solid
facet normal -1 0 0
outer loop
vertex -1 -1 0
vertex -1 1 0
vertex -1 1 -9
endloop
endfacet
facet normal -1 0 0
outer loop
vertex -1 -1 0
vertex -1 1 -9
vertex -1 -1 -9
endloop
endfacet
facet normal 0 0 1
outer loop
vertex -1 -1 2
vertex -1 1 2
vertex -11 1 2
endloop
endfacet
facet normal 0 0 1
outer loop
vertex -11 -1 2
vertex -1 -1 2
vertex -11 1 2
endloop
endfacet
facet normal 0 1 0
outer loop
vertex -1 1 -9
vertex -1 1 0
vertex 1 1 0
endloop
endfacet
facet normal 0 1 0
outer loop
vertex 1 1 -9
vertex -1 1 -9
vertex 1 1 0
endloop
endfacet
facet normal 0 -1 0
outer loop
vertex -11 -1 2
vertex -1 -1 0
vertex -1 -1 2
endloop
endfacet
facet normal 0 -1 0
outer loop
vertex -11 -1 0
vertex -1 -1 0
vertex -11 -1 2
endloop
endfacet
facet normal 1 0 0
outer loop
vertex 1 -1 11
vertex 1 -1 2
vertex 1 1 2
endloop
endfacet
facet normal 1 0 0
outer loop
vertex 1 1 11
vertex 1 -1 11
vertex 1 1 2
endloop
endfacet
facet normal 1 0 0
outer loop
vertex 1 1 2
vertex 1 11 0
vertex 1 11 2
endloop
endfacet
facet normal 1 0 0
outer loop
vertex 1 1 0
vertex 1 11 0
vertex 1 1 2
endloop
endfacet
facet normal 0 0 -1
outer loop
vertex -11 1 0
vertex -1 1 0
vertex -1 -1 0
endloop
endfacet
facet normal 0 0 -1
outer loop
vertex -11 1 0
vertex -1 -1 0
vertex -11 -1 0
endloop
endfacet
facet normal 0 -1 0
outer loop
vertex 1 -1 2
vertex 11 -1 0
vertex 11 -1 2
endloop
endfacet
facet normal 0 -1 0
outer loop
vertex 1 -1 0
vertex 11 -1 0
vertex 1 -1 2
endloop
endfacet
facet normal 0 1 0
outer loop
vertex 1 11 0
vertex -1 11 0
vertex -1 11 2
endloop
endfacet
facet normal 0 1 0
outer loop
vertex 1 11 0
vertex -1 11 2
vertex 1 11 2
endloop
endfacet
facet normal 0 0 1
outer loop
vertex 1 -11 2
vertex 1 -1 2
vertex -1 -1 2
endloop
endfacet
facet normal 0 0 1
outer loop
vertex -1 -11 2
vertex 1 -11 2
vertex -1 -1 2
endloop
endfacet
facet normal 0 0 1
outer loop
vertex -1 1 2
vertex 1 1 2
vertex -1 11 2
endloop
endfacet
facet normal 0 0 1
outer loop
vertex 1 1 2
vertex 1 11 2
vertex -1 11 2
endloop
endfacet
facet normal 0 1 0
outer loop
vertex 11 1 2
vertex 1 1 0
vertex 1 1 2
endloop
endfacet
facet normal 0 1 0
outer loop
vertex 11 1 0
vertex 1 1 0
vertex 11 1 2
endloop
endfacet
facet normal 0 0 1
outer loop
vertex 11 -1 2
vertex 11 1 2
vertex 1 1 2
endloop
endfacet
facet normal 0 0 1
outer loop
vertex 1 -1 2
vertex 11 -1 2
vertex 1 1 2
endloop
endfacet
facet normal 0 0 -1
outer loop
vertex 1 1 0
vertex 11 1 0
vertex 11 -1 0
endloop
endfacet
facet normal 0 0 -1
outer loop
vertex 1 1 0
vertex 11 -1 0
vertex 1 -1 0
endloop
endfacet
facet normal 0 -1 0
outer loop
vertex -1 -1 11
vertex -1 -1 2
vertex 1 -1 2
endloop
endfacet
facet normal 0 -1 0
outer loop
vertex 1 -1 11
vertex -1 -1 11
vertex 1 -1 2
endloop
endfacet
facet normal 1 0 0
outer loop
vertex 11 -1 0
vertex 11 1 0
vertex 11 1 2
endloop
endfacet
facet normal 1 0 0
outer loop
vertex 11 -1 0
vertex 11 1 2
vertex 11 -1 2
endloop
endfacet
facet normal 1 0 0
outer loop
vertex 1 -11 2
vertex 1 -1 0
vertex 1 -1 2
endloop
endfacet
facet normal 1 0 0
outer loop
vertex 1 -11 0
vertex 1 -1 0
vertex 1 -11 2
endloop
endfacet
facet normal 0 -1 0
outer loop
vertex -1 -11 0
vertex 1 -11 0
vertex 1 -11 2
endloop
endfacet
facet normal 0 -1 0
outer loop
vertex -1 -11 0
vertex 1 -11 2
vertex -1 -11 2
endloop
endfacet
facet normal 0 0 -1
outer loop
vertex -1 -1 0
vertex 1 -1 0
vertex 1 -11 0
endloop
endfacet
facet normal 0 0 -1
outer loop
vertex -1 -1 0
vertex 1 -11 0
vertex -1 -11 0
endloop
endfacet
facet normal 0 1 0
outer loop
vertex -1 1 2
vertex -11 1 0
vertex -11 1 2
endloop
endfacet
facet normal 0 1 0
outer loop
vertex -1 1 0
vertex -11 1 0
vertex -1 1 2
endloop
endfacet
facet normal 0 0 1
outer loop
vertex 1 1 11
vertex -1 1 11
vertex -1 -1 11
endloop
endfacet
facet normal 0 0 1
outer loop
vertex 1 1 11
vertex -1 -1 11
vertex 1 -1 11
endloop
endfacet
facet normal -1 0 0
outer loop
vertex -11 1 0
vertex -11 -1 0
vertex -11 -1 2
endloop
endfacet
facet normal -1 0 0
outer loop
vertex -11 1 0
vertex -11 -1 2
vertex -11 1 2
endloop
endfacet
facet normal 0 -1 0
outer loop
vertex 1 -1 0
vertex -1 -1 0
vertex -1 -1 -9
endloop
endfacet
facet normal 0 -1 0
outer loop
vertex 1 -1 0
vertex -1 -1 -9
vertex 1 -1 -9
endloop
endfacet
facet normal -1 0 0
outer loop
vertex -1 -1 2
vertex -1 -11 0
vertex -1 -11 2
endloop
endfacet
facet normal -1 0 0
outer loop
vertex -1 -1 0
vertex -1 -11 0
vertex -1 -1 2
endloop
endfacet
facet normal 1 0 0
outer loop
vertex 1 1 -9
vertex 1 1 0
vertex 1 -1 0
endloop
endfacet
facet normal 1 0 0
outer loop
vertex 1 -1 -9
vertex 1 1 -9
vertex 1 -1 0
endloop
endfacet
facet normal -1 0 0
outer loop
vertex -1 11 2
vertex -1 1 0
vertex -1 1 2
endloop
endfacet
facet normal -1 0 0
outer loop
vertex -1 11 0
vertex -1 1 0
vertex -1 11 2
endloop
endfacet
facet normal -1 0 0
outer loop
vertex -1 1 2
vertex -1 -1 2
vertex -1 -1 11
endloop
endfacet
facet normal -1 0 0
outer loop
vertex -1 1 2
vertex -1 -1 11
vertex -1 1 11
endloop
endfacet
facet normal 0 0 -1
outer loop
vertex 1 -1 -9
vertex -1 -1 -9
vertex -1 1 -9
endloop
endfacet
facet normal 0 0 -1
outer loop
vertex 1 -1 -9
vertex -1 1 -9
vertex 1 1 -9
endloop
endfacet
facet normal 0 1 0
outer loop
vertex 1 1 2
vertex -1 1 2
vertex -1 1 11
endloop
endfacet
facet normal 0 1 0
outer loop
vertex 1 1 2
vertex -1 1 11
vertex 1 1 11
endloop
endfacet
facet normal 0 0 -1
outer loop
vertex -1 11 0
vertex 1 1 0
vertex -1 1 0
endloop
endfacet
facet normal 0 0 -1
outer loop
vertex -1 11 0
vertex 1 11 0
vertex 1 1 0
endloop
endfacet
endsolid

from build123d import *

# Parameters (mm, degrees)
PAD_DEPTH    = 2
SKETCH001_W  = 2
SKETCH001_H  = 2
PAD001_DEPTH = 9
SKETCH002_W  = 2
SKETCH002_H  = 2
PAD002_DEPTH = 9


with BuildPart() as part:
    # Sketch → Pad (new body)
    with BuildSketch(Plane.XY):
        Polygon((-1, 1), (-1, 11), (1, 11), (1, 1), (11, 1), (11, -1), (1, -1), (1, -11), (-1, -11), (-1, -1), (-11, -1), (-11, 1), align=None)
    extrude(amount=PAD_DEPTH)

    # Sketch001 → Pad001 (new body)
    with BuildSketch(Plane.XY.offset(2)):
        Rectangle(SKETCH001_W, SKETCH001_H)
    extrude(amount=PAD001_DEPTH)

    # Sketch002 → Pad002 (new body)
    with BuildSketch(Plane(origin=(0, 0, 0), x_dir=(1, 0, 0), z_dir=(0, 0, -1))):
        Rectangle(SKETCH002_W, SKETCH002_H)
    extrude(amount=PAD002_DEPTH)


solid = part.part
